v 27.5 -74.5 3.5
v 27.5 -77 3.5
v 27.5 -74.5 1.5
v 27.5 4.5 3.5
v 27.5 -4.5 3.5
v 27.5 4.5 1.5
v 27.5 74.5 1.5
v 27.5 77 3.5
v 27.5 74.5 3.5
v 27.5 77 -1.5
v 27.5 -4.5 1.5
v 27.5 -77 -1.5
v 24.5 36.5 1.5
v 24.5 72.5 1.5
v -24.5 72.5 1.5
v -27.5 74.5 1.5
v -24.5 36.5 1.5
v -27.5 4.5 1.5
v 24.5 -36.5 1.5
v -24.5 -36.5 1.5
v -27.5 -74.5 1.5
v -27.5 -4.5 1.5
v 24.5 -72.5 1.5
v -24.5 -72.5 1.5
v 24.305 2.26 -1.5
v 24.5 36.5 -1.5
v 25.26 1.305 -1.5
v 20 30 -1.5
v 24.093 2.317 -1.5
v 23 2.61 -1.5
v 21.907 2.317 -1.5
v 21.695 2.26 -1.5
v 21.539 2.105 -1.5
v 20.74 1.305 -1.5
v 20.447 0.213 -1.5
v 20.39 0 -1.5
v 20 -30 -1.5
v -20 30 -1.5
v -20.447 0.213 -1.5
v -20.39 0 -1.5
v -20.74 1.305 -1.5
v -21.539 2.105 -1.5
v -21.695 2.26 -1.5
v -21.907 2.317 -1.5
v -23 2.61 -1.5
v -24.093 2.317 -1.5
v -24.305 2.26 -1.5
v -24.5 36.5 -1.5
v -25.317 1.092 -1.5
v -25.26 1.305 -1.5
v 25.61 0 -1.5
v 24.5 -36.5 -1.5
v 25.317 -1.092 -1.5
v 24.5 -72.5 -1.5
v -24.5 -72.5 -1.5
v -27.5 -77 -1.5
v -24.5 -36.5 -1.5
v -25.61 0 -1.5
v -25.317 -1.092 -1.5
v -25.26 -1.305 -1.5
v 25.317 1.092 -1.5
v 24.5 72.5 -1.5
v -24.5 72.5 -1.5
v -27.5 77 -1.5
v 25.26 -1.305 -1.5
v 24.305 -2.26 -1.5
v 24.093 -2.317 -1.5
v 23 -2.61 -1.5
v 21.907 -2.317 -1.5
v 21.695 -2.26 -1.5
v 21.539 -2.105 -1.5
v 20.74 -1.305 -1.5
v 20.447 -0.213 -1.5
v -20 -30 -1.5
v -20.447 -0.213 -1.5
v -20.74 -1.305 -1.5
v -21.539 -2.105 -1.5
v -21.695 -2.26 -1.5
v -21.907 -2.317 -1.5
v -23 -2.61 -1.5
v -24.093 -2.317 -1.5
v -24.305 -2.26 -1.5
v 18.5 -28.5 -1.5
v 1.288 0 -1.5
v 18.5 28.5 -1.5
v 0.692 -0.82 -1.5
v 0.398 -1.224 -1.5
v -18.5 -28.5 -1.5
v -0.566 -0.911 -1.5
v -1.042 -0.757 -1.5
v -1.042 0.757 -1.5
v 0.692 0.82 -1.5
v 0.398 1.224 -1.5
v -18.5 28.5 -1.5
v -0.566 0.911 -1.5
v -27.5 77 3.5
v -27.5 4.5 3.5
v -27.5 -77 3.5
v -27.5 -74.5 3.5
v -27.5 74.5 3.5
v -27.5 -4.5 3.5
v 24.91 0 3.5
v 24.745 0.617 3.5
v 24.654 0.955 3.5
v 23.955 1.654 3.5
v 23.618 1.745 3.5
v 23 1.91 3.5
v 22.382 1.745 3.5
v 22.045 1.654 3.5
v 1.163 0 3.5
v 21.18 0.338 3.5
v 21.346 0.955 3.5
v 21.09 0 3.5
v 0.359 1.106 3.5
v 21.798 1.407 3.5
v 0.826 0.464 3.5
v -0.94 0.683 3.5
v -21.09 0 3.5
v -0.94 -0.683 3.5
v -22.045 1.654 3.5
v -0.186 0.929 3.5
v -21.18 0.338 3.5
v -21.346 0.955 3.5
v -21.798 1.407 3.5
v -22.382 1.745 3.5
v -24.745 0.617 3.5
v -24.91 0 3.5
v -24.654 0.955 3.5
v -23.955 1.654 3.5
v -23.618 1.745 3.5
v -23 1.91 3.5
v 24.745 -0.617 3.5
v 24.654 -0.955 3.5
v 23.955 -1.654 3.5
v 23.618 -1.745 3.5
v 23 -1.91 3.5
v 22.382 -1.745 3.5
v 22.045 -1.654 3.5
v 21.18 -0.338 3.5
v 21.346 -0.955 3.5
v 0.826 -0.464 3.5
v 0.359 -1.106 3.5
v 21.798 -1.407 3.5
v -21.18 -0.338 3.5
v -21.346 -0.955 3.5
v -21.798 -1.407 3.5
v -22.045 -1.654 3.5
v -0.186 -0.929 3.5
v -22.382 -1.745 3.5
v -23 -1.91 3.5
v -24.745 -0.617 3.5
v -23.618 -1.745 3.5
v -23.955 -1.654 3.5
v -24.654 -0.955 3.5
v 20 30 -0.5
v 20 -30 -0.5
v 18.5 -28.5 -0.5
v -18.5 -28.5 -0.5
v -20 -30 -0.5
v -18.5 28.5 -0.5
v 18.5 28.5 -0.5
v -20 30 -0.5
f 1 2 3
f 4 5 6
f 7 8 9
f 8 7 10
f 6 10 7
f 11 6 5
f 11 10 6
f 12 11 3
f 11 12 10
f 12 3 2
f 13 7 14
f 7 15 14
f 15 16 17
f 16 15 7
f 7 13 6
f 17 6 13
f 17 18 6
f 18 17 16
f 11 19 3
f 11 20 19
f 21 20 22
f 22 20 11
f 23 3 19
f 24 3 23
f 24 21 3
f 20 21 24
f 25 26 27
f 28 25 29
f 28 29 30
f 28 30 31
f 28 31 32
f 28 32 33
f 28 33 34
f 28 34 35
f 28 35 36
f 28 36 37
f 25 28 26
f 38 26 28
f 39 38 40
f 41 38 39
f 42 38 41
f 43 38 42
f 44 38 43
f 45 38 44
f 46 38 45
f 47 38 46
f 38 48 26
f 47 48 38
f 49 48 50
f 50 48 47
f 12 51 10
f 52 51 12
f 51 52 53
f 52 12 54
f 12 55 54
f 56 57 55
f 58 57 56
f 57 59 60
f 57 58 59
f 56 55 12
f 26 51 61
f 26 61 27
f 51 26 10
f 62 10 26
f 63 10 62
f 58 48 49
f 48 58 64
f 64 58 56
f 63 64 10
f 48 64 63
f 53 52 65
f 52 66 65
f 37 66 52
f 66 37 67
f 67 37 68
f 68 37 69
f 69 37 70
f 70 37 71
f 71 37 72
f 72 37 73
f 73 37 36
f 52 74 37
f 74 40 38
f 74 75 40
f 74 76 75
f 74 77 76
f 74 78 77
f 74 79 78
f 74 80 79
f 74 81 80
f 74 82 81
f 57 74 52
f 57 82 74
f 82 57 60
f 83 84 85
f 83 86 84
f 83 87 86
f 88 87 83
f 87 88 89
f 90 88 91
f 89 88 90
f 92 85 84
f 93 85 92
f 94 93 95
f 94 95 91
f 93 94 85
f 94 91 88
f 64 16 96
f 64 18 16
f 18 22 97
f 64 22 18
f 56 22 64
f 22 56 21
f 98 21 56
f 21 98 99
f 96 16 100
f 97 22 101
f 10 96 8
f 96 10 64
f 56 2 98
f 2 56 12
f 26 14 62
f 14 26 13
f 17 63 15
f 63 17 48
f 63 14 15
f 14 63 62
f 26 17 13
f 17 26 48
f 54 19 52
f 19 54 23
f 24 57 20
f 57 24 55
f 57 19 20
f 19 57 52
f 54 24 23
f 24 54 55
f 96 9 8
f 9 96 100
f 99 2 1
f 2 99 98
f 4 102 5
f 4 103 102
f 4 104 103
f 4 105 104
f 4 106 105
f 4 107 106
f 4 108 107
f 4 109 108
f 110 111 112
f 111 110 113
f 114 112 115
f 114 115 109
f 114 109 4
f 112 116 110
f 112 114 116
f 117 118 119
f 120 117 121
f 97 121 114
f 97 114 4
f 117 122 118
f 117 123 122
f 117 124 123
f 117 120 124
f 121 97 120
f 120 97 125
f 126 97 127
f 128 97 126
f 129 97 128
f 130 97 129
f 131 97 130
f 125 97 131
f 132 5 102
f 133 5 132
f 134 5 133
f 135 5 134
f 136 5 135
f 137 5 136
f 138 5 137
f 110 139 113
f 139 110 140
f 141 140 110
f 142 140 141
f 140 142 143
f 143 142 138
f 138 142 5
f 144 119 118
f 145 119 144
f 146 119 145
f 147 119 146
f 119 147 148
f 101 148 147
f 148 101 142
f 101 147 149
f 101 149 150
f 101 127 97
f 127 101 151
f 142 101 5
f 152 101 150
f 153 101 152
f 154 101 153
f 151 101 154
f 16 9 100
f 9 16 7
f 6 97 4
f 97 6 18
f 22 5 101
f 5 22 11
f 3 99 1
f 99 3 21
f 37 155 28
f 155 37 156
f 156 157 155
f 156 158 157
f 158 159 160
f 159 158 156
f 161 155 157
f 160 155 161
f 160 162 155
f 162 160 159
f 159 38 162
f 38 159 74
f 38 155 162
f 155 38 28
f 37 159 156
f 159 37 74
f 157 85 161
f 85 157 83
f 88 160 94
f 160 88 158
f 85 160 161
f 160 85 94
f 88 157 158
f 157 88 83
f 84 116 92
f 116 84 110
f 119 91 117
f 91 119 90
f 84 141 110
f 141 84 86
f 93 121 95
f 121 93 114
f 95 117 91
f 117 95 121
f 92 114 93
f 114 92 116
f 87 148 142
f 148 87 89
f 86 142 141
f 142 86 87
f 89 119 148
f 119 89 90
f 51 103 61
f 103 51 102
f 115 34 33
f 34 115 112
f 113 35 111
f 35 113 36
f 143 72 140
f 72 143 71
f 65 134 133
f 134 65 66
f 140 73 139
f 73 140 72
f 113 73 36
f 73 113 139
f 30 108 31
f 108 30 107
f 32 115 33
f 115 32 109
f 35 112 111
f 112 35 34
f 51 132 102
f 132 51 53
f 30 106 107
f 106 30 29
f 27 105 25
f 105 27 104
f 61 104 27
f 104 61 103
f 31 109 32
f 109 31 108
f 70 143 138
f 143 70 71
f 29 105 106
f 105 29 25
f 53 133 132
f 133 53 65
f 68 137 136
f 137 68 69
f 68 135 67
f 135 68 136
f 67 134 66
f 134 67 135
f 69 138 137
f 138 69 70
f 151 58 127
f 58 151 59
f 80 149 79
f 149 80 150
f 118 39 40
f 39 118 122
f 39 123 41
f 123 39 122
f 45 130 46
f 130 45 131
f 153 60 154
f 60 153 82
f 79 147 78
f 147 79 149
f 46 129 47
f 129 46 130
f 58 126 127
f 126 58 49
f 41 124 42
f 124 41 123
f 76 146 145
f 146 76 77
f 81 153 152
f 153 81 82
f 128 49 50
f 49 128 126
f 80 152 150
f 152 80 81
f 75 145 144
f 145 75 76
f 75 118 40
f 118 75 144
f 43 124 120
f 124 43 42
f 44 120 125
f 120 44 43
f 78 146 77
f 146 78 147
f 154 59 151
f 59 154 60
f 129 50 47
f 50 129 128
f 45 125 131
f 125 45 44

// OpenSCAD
//Solar panel mounting and box
// v0.3
// jacoxon@googlemail.com

//Two large for my 3d printer so have add method of spliting design into two
// interlocking panels - just need to uncomment section at bottom in turn to
// show panels. Aiming to glue panels though could do PLA friction welding if
// you had a dremel.

//Size of panel
panel_width = 69;
panel_height = 110;
panel_depth = 2;

gap_between_panels = 10;
support_width = 3;

tolerance = 0.5;

m3_r = 3.8;
antenna_r = 1.5;

//Box inset to make it easier to add a box to the bottom
box_width = 60;
box_height = 40;
box_side_width = 3;
box_extra = box_width / 2;

difference(){
union() {
    //Create base
    difference(){
        cube([panel_height / 2, panel_width * 2 + gap_between_panels + (    support_width * 2), support_width], true);
        
        translate([0,(panel_width + gap_between_panels + box_extra) / 2,0]) cube([(     panel_height / 2 - (support_width * 2)), panel_width - (support_width +box_extra),support_width + 2], true);
        
        translate([0,-(panel_width + gap_between_panels + box_extra) / 2,0]) cube([(     panel_height / 2 - (support_width * 2)), panel_width - (support_width +box_extra),support_width + 2], true);
        
    }
    
    //Move up from base
    translate([0,0,panel_depth]) 
    //Generate edges to keep panels in place
    difference() {
        cube([panel_height / 2, panel_width * 2 + gap_between_panels + (    support_width * 2), support_width], true); 
    
        translate([0,(panel_width + gap_between_panels) / 2,0]) cube([(     panel_height / 2 + support_width), panel_width + (tolerance *2), support_width+2     ], true);
    
        translate([0,-(panel_width + gap_between_panels) / 2,0]) cube([(    panel_height / 2 + support_width), panel_width + (tolerance *2), support_width+2],
        true);
}
}

//Antenna hole
translate([0,0,-10]) cylinder(20, antenna_r, true);

//Bolt holes for support
translate([23,0,-10]) cylinder(20, m3_r, true);
translate([-23,0,-10]) cylinder(20, m3_r, true);

//Box ridge (to make a nice fit)
difference(){
    //outside
    translate([0,0,-2]) cube([box_height,box_width,3], true);
    //inside
    translate([0,0,-2]) cube([box_height - box_side_width ,box_width - box_side_width,3], true);
}

//Big box to remove one whole section
//To make panel One
//translate([0,panel_width / 2 + (gap_between_panels / 2) + support_width,0]) cube([panel_height,panel_width + support_width + 5,10], true);
//translate([0,0,0]) cube([(panel_height / 2) / 3 + tolerance, gap_between_panels + tolerance,10], true);

//To make panel Two
//translate([0,- (panel_width / 2 + (gap_between_panels / 2) + support_width),0]) cube([panel_height,panel_width + support_width + 5,10], true);
//translate([(panel_height / 2) / 3,0,0]) cube([(panel_height / 2) / 3 + tolerance, gap_between_panels + tolerance,10], true);
//translate([-((panel_height / 2) / 3),0,0]) cube([(panel_height / 2) / 3 + tolerance, gap_between_panels + tolerance,10], true);
}
